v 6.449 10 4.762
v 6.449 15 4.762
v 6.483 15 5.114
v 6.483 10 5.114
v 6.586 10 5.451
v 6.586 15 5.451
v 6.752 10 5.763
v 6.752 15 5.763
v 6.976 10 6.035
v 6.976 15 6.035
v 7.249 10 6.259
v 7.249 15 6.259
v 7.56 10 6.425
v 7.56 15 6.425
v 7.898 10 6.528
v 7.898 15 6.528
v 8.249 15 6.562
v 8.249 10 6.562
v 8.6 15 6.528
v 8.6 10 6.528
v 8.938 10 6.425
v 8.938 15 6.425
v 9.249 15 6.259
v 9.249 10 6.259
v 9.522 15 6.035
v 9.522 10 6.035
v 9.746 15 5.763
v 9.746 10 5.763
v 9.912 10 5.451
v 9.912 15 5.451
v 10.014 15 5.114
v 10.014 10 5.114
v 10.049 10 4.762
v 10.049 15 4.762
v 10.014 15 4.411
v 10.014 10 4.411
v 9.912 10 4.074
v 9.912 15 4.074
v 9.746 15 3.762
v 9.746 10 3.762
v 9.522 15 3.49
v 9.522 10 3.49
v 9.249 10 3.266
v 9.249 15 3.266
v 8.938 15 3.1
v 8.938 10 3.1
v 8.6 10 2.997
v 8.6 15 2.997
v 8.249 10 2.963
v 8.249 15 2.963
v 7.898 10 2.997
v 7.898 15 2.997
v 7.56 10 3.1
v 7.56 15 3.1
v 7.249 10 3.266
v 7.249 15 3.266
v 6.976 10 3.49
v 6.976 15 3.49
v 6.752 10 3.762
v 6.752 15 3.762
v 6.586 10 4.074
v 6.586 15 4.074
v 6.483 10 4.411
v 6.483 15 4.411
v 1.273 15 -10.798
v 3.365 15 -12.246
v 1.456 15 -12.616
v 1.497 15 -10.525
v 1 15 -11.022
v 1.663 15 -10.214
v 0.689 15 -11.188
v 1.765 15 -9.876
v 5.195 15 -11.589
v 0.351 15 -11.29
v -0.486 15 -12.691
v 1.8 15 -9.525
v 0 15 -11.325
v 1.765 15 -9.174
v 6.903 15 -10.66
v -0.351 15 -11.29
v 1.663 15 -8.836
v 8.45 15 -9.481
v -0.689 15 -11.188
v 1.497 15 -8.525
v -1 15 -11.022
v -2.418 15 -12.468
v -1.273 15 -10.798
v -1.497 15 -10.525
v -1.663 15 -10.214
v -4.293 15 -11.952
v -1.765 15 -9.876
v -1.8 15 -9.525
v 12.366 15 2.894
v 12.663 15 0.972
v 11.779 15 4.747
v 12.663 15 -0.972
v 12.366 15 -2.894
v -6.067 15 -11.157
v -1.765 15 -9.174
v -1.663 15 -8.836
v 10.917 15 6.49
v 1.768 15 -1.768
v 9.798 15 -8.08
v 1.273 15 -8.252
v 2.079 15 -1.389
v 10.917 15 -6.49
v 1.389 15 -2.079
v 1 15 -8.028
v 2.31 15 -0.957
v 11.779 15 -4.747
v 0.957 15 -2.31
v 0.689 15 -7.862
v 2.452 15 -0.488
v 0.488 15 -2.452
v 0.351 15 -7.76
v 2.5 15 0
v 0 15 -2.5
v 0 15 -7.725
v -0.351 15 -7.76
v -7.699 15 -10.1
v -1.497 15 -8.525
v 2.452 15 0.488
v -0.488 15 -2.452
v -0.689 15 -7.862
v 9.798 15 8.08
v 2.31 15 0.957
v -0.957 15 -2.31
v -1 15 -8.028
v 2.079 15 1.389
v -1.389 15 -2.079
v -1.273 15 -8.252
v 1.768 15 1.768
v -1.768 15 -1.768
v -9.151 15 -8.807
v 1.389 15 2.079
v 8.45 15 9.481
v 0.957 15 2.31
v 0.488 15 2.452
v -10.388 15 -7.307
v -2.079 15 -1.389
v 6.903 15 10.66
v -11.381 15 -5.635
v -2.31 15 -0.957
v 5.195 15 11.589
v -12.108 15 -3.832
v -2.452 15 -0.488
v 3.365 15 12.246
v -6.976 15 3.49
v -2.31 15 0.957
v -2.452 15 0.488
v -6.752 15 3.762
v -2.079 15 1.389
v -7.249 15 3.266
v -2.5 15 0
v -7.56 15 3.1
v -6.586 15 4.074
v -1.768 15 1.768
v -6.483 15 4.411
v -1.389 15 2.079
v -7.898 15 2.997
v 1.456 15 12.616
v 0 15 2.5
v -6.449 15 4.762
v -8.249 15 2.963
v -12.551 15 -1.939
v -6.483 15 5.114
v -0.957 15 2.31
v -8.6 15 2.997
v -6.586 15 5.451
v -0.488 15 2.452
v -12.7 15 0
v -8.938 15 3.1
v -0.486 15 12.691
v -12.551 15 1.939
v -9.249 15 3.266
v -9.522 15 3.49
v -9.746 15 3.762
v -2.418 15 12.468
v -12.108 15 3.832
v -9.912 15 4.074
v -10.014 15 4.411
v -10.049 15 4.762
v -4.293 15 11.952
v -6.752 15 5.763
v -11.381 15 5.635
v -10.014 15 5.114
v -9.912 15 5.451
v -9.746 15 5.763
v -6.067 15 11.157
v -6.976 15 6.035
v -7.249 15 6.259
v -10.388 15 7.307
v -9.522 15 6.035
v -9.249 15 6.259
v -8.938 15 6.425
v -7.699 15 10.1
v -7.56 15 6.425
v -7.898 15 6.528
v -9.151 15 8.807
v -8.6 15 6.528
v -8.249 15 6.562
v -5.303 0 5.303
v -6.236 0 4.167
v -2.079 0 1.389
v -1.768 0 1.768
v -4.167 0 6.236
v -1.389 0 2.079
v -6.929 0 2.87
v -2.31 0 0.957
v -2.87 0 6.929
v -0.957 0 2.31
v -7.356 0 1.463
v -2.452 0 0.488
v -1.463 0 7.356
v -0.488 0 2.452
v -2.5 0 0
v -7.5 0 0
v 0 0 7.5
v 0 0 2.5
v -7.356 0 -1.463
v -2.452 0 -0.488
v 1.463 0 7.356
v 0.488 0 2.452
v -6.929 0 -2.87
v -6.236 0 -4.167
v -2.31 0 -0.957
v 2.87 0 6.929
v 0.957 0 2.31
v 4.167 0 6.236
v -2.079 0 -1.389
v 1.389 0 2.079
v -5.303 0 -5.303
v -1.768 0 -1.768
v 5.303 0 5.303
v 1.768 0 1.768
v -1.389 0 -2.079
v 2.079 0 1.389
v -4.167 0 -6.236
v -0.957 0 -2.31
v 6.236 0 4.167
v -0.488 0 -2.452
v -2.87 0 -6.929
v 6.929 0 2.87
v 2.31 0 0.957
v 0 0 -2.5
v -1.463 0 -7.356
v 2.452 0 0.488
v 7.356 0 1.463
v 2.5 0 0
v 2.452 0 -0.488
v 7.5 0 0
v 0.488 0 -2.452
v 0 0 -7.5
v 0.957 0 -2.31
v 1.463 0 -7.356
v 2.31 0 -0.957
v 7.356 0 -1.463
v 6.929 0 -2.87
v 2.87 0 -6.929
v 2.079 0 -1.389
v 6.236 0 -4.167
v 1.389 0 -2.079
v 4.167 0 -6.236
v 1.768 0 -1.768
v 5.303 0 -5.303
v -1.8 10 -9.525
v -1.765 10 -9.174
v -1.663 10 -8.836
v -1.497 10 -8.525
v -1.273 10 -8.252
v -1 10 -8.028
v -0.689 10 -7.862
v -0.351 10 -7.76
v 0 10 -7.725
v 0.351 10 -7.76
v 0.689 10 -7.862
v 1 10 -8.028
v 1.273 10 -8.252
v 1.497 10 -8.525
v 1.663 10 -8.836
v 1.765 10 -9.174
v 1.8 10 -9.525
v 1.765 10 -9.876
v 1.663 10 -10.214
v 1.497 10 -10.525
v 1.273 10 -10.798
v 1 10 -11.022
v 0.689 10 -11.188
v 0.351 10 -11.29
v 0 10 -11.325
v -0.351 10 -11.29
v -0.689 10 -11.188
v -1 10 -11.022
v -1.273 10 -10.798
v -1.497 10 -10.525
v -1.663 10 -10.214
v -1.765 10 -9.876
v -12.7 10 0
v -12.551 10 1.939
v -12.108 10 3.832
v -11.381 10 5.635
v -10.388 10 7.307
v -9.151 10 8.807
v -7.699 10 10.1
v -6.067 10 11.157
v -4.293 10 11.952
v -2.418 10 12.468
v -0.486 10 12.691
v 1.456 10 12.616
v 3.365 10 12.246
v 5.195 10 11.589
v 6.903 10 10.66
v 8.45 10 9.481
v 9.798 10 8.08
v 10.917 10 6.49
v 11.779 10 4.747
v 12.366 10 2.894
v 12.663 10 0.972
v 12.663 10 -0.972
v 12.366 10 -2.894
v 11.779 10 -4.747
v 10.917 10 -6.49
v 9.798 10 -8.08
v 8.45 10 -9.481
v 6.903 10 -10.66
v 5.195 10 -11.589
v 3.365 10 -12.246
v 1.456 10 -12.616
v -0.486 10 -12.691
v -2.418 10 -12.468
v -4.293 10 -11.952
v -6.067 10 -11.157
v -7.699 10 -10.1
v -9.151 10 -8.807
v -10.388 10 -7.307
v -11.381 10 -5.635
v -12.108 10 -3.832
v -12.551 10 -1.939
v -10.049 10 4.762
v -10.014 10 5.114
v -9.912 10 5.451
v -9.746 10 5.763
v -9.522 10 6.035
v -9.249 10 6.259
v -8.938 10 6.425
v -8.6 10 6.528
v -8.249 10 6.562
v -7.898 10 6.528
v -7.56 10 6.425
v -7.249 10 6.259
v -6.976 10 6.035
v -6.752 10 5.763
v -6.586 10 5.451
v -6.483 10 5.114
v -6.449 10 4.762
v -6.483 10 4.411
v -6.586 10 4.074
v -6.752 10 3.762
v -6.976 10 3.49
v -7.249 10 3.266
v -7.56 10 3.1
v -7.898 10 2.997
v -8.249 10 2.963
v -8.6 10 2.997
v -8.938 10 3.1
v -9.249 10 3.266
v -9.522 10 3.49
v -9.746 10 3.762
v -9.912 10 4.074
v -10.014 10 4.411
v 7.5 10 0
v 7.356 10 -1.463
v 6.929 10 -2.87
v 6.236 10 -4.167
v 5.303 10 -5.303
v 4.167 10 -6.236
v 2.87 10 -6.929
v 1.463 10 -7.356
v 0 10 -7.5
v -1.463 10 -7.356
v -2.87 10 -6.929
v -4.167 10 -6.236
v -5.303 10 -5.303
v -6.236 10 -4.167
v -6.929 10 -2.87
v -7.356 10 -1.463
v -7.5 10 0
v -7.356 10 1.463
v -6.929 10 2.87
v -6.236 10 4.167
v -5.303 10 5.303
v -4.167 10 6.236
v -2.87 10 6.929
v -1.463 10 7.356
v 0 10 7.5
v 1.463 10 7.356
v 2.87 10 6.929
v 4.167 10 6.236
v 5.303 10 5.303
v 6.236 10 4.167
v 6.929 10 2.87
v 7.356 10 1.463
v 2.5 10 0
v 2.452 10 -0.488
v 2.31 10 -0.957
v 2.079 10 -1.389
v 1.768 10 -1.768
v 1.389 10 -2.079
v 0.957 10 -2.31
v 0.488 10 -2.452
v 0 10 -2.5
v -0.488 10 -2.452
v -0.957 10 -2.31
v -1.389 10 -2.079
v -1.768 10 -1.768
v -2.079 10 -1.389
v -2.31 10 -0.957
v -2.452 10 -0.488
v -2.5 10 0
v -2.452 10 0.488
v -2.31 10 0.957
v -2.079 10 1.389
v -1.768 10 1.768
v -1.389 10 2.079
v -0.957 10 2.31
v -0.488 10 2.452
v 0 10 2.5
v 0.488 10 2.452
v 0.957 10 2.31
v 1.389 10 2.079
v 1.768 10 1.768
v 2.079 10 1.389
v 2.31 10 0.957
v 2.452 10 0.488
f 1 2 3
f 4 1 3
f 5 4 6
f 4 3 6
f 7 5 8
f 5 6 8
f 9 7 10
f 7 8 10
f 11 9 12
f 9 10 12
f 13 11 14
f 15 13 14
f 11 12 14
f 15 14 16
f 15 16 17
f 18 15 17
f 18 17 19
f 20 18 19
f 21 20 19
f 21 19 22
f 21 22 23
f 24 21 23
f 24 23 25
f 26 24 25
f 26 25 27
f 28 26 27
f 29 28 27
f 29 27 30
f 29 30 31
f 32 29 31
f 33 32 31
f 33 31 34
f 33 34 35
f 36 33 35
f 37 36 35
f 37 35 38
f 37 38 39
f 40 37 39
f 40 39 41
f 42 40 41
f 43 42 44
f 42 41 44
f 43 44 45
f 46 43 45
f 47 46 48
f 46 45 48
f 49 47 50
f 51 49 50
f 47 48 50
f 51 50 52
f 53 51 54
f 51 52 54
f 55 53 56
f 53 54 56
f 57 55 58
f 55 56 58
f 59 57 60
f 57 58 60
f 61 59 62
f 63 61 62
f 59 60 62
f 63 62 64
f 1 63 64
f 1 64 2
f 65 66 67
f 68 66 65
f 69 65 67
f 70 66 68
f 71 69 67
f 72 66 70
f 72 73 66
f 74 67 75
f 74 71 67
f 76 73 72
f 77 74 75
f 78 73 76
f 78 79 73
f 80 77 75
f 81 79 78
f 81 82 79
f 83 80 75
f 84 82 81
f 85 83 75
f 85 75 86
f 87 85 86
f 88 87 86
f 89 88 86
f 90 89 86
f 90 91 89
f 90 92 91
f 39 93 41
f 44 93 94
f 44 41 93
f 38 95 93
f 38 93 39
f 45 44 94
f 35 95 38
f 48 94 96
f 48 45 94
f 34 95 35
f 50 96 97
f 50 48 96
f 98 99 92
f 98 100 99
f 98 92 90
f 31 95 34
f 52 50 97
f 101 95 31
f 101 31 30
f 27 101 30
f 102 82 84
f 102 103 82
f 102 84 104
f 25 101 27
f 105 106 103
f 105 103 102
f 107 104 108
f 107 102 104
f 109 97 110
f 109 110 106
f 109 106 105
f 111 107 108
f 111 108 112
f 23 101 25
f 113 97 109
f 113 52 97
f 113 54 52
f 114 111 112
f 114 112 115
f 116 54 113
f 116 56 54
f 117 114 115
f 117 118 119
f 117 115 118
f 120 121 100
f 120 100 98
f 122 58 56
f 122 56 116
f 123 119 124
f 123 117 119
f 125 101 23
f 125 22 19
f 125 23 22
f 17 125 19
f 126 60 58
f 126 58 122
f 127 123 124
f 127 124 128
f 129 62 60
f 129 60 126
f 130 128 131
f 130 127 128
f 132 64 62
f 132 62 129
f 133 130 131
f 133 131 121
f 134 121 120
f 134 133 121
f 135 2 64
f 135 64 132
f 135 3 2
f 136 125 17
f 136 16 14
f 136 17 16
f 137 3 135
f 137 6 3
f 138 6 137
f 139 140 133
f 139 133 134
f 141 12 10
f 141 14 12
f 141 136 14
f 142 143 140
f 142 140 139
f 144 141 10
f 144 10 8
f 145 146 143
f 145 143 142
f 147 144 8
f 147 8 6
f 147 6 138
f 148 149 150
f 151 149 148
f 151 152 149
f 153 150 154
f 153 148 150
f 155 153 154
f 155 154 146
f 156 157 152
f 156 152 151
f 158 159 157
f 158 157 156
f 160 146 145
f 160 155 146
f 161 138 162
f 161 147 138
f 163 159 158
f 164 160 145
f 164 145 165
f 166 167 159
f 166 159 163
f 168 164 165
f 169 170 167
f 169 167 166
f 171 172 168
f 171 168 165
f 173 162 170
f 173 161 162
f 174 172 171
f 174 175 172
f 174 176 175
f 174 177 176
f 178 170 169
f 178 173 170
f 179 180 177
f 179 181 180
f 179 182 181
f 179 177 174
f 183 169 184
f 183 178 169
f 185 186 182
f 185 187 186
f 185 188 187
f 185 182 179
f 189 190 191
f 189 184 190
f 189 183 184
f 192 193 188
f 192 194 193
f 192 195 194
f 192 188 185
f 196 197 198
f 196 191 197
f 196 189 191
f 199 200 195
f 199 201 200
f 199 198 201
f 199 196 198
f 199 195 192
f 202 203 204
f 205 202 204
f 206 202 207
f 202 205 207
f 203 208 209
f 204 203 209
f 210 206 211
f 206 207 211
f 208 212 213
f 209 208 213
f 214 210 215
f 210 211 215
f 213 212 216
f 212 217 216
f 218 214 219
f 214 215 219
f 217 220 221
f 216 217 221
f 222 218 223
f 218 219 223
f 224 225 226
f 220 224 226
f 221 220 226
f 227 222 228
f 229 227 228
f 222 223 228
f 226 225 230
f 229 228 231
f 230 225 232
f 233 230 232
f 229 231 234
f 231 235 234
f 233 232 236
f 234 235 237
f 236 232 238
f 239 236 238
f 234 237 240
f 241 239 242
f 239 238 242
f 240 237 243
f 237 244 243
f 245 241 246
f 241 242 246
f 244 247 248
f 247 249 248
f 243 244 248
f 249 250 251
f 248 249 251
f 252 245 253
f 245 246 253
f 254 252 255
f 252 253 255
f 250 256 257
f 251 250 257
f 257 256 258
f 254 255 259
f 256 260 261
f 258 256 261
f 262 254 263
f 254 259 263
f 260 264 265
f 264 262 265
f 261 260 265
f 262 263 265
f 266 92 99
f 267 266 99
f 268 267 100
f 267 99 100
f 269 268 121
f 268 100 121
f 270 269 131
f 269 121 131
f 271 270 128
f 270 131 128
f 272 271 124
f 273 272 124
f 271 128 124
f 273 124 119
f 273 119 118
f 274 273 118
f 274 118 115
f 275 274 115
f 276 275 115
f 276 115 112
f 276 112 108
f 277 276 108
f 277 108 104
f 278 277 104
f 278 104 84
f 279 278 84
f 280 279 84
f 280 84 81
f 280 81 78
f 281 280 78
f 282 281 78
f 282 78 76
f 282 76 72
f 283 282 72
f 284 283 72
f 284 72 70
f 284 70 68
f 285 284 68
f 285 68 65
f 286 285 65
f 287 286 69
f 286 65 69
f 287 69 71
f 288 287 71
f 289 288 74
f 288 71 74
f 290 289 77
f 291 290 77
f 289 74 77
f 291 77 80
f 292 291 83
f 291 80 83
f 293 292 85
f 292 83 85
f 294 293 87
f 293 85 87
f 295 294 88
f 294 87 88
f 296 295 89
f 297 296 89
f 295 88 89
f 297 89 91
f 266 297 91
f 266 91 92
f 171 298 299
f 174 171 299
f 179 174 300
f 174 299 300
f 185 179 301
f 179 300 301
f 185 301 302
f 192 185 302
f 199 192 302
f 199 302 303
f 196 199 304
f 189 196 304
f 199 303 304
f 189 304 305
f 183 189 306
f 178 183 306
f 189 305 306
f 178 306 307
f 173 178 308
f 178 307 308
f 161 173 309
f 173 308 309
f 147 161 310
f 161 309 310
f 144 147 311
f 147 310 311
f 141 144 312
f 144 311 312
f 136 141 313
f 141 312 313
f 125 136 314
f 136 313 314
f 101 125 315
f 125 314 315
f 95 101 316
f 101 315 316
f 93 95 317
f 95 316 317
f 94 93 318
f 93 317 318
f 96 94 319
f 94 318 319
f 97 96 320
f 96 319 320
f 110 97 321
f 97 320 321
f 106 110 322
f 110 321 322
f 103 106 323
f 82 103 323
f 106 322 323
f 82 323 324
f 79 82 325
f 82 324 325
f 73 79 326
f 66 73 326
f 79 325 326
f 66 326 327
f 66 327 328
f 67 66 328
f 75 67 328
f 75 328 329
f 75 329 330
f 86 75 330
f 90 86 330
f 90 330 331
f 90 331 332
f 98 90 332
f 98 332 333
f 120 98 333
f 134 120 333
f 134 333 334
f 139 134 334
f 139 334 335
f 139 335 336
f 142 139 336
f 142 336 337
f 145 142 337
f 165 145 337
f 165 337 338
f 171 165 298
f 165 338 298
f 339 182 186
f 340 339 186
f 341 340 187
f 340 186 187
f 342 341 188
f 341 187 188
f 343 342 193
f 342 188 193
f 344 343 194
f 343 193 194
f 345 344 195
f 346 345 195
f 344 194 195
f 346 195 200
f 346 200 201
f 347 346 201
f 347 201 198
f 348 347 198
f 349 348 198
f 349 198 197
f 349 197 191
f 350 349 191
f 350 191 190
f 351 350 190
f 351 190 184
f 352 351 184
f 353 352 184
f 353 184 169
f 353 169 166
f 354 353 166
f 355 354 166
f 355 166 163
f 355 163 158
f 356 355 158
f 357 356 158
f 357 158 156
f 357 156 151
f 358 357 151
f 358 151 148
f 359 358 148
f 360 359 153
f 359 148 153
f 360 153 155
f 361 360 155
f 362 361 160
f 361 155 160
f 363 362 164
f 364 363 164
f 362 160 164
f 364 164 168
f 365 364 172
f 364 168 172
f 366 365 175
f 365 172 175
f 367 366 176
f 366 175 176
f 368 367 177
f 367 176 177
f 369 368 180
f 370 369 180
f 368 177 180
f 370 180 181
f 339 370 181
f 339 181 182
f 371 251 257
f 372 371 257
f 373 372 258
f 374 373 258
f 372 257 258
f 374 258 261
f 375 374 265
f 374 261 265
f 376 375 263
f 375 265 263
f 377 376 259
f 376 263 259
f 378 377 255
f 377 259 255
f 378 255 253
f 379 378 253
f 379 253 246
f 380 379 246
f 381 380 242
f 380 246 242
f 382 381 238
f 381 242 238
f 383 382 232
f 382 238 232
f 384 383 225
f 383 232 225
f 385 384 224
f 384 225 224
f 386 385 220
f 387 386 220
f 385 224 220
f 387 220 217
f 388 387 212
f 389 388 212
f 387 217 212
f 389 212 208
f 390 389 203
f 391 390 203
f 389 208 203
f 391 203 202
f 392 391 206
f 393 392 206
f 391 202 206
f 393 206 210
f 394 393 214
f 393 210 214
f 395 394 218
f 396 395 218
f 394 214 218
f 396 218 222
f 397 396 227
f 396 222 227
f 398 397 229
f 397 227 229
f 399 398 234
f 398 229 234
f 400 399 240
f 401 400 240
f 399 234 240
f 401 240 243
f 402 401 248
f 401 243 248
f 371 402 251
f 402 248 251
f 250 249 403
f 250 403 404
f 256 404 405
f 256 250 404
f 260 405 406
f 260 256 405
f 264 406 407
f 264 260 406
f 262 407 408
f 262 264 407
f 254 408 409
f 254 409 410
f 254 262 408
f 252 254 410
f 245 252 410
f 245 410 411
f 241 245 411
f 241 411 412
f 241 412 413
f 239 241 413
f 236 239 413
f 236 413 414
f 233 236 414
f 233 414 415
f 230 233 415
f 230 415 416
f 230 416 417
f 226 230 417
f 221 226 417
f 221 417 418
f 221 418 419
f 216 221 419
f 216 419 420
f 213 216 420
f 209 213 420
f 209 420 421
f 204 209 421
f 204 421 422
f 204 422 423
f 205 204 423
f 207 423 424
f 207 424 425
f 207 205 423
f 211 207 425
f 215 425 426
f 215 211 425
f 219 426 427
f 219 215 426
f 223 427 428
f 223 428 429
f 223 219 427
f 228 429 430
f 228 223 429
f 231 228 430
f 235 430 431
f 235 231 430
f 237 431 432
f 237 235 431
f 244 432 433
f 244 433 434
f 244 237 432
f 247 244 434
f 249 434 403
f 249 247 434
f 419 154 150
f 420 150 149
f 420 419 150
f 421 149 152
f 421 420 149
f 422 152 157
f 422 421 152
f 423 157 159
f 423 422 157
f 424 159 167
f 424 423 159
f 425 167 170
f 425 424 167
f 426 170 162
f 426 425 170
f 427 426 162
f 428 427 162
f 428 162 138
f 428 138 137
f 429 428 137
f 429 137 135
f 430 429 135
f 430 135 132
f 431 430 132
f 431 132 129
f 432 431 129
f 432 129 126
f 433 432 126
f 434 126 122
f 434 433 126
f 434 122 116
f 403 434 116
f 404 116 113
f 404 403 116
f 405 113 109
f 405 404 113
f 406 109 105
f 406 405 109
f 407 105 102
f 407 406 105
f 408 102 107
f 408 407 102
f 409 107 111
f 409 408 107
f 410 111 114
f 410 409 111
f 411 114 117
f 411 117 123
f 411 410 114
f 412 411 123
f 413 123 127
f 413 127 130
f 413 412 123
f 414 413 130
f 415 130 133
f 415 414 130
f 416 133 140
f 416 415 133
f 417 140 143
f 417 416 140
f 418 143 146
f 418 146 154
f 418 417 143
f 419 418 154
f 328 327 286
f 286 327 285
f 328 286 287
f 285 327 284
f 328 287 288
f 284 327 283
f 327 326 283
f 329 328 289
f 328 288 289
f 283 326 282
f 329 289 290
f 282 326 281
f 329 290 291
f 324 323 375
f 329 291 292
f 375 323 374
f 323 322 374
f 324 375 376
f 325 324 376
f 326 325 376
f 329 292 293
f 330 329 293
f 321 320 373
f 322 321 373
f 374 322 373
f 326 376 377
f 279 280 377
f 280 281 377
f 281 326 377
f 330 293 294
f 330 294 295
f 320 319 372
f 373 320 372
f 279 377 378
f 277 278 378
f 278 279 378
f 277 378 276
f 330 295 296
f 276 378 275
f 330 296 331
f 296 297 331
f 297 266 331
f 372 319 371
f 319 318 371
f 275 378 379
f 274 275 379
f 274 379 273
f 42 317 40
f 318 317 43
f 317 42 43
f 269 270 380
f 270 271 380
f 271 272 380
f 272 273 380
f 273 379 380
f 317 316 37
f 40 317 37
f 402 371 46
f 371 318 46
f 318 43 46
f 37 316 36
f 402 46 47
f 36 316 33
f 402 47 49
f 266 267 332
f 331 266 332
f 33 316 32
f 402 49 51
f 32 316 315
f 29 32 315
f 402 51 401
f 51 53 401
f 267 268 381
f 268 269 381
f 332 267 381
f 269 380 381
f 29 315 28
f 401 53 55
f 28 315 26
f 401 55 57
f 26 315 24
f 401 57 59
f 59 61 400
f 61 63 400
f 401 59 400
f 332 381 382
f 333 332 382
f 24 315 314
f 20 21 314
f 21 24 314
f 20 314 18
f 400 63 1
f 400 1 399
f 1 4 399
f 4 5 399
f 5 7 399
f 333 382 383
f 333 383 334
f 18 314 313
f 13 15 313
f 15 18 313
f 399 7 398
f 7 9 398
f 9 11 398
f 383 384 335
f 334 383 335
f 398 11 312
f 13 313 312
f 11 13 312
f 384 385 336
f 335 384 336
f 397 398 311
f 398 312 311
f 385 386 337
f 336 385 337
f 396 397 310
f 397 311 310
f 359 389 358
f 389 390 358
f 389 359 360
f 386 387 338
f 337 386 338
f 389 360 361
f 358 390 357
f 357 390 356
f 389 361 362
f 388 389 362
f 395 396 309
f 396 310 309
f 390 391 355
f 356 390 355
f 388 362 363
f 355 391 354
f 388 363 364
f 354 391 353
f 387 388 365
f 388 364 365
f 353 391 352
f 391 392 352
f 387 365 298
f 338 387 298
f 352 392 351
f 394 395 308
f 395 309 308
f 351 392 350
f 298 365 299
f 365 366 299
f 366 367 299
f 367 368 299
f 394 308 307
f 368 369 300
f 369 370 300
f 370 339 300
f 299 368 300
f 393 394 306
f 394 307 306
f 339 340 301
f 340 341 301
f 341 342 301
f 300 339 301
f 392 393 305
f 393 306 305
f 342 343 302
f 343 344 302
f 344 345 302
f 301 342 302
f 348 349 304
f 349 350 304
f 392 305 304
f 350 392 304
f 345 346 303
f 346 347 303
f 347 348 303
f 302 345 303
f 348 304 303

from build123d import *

# Parameters (mm, degrees)
SKETCH1_R           = 7.5
SKETCH1_R_2         = 2.5
BOSS_EXTRUDE1_DEPTH = 10
SKETCH2_R           = 12.7
SKETCH2_R_2         = 2.5
BOSS_EXTRUDE2_DEPTH = 5
SKETCH3_R           = 1.8
CUT_EXTRUDE1_DEPTH  = 16


with BuildPart() as part:
    # Sketch1 → Boss-Extrude1 (new body)
    with BuildSketch(Plane(origin=(0, 0, 0), x_dir=(1, 0, 0), z_dir=(0, 1, 0))):
        Circle(SKETCH1_R)
        Circle(SKETCH1_R_2, mode=Mode.SUBTRACT)
    extrude(amount=BOSS_EXTRUDE1_DEPTH)

    # Sketch2 → Boss-Extrude2 (add)
    with BuildSketch(Plane(origin=(0, 10, 0), x_dir=(-1, 0, 0), z_dir=(0, 1, 0))):
        Circle(SKETCH2_R)
        Circle(SKETCH2_R_2, mode=Mode.SUBTRACT)
    extrude(amount=BOSS_EXTRUDE2_DEPTH)

    # Sketch3 → Cut-Extrude1 (cut, through all)
    with BuildSketch(Plane(origin=(0, 15, 0), x_dir=(-1, 0, 0), z_dir=(0, 1, 0))):
        with Locations((0, -9.525)):
            Circle(SKETCH3_R)
        with Locations((-8.248891971, 4.7625)):
            Circle(SKETCH3_R)
        with Locations((8.248891971, 4.7625)):
            Circle(SKETCH3_R)
    extrude(amount=-CUT_EXTRUDE1_DEPTH, mode=Mode.SUBTRACT)


solid = part.part
